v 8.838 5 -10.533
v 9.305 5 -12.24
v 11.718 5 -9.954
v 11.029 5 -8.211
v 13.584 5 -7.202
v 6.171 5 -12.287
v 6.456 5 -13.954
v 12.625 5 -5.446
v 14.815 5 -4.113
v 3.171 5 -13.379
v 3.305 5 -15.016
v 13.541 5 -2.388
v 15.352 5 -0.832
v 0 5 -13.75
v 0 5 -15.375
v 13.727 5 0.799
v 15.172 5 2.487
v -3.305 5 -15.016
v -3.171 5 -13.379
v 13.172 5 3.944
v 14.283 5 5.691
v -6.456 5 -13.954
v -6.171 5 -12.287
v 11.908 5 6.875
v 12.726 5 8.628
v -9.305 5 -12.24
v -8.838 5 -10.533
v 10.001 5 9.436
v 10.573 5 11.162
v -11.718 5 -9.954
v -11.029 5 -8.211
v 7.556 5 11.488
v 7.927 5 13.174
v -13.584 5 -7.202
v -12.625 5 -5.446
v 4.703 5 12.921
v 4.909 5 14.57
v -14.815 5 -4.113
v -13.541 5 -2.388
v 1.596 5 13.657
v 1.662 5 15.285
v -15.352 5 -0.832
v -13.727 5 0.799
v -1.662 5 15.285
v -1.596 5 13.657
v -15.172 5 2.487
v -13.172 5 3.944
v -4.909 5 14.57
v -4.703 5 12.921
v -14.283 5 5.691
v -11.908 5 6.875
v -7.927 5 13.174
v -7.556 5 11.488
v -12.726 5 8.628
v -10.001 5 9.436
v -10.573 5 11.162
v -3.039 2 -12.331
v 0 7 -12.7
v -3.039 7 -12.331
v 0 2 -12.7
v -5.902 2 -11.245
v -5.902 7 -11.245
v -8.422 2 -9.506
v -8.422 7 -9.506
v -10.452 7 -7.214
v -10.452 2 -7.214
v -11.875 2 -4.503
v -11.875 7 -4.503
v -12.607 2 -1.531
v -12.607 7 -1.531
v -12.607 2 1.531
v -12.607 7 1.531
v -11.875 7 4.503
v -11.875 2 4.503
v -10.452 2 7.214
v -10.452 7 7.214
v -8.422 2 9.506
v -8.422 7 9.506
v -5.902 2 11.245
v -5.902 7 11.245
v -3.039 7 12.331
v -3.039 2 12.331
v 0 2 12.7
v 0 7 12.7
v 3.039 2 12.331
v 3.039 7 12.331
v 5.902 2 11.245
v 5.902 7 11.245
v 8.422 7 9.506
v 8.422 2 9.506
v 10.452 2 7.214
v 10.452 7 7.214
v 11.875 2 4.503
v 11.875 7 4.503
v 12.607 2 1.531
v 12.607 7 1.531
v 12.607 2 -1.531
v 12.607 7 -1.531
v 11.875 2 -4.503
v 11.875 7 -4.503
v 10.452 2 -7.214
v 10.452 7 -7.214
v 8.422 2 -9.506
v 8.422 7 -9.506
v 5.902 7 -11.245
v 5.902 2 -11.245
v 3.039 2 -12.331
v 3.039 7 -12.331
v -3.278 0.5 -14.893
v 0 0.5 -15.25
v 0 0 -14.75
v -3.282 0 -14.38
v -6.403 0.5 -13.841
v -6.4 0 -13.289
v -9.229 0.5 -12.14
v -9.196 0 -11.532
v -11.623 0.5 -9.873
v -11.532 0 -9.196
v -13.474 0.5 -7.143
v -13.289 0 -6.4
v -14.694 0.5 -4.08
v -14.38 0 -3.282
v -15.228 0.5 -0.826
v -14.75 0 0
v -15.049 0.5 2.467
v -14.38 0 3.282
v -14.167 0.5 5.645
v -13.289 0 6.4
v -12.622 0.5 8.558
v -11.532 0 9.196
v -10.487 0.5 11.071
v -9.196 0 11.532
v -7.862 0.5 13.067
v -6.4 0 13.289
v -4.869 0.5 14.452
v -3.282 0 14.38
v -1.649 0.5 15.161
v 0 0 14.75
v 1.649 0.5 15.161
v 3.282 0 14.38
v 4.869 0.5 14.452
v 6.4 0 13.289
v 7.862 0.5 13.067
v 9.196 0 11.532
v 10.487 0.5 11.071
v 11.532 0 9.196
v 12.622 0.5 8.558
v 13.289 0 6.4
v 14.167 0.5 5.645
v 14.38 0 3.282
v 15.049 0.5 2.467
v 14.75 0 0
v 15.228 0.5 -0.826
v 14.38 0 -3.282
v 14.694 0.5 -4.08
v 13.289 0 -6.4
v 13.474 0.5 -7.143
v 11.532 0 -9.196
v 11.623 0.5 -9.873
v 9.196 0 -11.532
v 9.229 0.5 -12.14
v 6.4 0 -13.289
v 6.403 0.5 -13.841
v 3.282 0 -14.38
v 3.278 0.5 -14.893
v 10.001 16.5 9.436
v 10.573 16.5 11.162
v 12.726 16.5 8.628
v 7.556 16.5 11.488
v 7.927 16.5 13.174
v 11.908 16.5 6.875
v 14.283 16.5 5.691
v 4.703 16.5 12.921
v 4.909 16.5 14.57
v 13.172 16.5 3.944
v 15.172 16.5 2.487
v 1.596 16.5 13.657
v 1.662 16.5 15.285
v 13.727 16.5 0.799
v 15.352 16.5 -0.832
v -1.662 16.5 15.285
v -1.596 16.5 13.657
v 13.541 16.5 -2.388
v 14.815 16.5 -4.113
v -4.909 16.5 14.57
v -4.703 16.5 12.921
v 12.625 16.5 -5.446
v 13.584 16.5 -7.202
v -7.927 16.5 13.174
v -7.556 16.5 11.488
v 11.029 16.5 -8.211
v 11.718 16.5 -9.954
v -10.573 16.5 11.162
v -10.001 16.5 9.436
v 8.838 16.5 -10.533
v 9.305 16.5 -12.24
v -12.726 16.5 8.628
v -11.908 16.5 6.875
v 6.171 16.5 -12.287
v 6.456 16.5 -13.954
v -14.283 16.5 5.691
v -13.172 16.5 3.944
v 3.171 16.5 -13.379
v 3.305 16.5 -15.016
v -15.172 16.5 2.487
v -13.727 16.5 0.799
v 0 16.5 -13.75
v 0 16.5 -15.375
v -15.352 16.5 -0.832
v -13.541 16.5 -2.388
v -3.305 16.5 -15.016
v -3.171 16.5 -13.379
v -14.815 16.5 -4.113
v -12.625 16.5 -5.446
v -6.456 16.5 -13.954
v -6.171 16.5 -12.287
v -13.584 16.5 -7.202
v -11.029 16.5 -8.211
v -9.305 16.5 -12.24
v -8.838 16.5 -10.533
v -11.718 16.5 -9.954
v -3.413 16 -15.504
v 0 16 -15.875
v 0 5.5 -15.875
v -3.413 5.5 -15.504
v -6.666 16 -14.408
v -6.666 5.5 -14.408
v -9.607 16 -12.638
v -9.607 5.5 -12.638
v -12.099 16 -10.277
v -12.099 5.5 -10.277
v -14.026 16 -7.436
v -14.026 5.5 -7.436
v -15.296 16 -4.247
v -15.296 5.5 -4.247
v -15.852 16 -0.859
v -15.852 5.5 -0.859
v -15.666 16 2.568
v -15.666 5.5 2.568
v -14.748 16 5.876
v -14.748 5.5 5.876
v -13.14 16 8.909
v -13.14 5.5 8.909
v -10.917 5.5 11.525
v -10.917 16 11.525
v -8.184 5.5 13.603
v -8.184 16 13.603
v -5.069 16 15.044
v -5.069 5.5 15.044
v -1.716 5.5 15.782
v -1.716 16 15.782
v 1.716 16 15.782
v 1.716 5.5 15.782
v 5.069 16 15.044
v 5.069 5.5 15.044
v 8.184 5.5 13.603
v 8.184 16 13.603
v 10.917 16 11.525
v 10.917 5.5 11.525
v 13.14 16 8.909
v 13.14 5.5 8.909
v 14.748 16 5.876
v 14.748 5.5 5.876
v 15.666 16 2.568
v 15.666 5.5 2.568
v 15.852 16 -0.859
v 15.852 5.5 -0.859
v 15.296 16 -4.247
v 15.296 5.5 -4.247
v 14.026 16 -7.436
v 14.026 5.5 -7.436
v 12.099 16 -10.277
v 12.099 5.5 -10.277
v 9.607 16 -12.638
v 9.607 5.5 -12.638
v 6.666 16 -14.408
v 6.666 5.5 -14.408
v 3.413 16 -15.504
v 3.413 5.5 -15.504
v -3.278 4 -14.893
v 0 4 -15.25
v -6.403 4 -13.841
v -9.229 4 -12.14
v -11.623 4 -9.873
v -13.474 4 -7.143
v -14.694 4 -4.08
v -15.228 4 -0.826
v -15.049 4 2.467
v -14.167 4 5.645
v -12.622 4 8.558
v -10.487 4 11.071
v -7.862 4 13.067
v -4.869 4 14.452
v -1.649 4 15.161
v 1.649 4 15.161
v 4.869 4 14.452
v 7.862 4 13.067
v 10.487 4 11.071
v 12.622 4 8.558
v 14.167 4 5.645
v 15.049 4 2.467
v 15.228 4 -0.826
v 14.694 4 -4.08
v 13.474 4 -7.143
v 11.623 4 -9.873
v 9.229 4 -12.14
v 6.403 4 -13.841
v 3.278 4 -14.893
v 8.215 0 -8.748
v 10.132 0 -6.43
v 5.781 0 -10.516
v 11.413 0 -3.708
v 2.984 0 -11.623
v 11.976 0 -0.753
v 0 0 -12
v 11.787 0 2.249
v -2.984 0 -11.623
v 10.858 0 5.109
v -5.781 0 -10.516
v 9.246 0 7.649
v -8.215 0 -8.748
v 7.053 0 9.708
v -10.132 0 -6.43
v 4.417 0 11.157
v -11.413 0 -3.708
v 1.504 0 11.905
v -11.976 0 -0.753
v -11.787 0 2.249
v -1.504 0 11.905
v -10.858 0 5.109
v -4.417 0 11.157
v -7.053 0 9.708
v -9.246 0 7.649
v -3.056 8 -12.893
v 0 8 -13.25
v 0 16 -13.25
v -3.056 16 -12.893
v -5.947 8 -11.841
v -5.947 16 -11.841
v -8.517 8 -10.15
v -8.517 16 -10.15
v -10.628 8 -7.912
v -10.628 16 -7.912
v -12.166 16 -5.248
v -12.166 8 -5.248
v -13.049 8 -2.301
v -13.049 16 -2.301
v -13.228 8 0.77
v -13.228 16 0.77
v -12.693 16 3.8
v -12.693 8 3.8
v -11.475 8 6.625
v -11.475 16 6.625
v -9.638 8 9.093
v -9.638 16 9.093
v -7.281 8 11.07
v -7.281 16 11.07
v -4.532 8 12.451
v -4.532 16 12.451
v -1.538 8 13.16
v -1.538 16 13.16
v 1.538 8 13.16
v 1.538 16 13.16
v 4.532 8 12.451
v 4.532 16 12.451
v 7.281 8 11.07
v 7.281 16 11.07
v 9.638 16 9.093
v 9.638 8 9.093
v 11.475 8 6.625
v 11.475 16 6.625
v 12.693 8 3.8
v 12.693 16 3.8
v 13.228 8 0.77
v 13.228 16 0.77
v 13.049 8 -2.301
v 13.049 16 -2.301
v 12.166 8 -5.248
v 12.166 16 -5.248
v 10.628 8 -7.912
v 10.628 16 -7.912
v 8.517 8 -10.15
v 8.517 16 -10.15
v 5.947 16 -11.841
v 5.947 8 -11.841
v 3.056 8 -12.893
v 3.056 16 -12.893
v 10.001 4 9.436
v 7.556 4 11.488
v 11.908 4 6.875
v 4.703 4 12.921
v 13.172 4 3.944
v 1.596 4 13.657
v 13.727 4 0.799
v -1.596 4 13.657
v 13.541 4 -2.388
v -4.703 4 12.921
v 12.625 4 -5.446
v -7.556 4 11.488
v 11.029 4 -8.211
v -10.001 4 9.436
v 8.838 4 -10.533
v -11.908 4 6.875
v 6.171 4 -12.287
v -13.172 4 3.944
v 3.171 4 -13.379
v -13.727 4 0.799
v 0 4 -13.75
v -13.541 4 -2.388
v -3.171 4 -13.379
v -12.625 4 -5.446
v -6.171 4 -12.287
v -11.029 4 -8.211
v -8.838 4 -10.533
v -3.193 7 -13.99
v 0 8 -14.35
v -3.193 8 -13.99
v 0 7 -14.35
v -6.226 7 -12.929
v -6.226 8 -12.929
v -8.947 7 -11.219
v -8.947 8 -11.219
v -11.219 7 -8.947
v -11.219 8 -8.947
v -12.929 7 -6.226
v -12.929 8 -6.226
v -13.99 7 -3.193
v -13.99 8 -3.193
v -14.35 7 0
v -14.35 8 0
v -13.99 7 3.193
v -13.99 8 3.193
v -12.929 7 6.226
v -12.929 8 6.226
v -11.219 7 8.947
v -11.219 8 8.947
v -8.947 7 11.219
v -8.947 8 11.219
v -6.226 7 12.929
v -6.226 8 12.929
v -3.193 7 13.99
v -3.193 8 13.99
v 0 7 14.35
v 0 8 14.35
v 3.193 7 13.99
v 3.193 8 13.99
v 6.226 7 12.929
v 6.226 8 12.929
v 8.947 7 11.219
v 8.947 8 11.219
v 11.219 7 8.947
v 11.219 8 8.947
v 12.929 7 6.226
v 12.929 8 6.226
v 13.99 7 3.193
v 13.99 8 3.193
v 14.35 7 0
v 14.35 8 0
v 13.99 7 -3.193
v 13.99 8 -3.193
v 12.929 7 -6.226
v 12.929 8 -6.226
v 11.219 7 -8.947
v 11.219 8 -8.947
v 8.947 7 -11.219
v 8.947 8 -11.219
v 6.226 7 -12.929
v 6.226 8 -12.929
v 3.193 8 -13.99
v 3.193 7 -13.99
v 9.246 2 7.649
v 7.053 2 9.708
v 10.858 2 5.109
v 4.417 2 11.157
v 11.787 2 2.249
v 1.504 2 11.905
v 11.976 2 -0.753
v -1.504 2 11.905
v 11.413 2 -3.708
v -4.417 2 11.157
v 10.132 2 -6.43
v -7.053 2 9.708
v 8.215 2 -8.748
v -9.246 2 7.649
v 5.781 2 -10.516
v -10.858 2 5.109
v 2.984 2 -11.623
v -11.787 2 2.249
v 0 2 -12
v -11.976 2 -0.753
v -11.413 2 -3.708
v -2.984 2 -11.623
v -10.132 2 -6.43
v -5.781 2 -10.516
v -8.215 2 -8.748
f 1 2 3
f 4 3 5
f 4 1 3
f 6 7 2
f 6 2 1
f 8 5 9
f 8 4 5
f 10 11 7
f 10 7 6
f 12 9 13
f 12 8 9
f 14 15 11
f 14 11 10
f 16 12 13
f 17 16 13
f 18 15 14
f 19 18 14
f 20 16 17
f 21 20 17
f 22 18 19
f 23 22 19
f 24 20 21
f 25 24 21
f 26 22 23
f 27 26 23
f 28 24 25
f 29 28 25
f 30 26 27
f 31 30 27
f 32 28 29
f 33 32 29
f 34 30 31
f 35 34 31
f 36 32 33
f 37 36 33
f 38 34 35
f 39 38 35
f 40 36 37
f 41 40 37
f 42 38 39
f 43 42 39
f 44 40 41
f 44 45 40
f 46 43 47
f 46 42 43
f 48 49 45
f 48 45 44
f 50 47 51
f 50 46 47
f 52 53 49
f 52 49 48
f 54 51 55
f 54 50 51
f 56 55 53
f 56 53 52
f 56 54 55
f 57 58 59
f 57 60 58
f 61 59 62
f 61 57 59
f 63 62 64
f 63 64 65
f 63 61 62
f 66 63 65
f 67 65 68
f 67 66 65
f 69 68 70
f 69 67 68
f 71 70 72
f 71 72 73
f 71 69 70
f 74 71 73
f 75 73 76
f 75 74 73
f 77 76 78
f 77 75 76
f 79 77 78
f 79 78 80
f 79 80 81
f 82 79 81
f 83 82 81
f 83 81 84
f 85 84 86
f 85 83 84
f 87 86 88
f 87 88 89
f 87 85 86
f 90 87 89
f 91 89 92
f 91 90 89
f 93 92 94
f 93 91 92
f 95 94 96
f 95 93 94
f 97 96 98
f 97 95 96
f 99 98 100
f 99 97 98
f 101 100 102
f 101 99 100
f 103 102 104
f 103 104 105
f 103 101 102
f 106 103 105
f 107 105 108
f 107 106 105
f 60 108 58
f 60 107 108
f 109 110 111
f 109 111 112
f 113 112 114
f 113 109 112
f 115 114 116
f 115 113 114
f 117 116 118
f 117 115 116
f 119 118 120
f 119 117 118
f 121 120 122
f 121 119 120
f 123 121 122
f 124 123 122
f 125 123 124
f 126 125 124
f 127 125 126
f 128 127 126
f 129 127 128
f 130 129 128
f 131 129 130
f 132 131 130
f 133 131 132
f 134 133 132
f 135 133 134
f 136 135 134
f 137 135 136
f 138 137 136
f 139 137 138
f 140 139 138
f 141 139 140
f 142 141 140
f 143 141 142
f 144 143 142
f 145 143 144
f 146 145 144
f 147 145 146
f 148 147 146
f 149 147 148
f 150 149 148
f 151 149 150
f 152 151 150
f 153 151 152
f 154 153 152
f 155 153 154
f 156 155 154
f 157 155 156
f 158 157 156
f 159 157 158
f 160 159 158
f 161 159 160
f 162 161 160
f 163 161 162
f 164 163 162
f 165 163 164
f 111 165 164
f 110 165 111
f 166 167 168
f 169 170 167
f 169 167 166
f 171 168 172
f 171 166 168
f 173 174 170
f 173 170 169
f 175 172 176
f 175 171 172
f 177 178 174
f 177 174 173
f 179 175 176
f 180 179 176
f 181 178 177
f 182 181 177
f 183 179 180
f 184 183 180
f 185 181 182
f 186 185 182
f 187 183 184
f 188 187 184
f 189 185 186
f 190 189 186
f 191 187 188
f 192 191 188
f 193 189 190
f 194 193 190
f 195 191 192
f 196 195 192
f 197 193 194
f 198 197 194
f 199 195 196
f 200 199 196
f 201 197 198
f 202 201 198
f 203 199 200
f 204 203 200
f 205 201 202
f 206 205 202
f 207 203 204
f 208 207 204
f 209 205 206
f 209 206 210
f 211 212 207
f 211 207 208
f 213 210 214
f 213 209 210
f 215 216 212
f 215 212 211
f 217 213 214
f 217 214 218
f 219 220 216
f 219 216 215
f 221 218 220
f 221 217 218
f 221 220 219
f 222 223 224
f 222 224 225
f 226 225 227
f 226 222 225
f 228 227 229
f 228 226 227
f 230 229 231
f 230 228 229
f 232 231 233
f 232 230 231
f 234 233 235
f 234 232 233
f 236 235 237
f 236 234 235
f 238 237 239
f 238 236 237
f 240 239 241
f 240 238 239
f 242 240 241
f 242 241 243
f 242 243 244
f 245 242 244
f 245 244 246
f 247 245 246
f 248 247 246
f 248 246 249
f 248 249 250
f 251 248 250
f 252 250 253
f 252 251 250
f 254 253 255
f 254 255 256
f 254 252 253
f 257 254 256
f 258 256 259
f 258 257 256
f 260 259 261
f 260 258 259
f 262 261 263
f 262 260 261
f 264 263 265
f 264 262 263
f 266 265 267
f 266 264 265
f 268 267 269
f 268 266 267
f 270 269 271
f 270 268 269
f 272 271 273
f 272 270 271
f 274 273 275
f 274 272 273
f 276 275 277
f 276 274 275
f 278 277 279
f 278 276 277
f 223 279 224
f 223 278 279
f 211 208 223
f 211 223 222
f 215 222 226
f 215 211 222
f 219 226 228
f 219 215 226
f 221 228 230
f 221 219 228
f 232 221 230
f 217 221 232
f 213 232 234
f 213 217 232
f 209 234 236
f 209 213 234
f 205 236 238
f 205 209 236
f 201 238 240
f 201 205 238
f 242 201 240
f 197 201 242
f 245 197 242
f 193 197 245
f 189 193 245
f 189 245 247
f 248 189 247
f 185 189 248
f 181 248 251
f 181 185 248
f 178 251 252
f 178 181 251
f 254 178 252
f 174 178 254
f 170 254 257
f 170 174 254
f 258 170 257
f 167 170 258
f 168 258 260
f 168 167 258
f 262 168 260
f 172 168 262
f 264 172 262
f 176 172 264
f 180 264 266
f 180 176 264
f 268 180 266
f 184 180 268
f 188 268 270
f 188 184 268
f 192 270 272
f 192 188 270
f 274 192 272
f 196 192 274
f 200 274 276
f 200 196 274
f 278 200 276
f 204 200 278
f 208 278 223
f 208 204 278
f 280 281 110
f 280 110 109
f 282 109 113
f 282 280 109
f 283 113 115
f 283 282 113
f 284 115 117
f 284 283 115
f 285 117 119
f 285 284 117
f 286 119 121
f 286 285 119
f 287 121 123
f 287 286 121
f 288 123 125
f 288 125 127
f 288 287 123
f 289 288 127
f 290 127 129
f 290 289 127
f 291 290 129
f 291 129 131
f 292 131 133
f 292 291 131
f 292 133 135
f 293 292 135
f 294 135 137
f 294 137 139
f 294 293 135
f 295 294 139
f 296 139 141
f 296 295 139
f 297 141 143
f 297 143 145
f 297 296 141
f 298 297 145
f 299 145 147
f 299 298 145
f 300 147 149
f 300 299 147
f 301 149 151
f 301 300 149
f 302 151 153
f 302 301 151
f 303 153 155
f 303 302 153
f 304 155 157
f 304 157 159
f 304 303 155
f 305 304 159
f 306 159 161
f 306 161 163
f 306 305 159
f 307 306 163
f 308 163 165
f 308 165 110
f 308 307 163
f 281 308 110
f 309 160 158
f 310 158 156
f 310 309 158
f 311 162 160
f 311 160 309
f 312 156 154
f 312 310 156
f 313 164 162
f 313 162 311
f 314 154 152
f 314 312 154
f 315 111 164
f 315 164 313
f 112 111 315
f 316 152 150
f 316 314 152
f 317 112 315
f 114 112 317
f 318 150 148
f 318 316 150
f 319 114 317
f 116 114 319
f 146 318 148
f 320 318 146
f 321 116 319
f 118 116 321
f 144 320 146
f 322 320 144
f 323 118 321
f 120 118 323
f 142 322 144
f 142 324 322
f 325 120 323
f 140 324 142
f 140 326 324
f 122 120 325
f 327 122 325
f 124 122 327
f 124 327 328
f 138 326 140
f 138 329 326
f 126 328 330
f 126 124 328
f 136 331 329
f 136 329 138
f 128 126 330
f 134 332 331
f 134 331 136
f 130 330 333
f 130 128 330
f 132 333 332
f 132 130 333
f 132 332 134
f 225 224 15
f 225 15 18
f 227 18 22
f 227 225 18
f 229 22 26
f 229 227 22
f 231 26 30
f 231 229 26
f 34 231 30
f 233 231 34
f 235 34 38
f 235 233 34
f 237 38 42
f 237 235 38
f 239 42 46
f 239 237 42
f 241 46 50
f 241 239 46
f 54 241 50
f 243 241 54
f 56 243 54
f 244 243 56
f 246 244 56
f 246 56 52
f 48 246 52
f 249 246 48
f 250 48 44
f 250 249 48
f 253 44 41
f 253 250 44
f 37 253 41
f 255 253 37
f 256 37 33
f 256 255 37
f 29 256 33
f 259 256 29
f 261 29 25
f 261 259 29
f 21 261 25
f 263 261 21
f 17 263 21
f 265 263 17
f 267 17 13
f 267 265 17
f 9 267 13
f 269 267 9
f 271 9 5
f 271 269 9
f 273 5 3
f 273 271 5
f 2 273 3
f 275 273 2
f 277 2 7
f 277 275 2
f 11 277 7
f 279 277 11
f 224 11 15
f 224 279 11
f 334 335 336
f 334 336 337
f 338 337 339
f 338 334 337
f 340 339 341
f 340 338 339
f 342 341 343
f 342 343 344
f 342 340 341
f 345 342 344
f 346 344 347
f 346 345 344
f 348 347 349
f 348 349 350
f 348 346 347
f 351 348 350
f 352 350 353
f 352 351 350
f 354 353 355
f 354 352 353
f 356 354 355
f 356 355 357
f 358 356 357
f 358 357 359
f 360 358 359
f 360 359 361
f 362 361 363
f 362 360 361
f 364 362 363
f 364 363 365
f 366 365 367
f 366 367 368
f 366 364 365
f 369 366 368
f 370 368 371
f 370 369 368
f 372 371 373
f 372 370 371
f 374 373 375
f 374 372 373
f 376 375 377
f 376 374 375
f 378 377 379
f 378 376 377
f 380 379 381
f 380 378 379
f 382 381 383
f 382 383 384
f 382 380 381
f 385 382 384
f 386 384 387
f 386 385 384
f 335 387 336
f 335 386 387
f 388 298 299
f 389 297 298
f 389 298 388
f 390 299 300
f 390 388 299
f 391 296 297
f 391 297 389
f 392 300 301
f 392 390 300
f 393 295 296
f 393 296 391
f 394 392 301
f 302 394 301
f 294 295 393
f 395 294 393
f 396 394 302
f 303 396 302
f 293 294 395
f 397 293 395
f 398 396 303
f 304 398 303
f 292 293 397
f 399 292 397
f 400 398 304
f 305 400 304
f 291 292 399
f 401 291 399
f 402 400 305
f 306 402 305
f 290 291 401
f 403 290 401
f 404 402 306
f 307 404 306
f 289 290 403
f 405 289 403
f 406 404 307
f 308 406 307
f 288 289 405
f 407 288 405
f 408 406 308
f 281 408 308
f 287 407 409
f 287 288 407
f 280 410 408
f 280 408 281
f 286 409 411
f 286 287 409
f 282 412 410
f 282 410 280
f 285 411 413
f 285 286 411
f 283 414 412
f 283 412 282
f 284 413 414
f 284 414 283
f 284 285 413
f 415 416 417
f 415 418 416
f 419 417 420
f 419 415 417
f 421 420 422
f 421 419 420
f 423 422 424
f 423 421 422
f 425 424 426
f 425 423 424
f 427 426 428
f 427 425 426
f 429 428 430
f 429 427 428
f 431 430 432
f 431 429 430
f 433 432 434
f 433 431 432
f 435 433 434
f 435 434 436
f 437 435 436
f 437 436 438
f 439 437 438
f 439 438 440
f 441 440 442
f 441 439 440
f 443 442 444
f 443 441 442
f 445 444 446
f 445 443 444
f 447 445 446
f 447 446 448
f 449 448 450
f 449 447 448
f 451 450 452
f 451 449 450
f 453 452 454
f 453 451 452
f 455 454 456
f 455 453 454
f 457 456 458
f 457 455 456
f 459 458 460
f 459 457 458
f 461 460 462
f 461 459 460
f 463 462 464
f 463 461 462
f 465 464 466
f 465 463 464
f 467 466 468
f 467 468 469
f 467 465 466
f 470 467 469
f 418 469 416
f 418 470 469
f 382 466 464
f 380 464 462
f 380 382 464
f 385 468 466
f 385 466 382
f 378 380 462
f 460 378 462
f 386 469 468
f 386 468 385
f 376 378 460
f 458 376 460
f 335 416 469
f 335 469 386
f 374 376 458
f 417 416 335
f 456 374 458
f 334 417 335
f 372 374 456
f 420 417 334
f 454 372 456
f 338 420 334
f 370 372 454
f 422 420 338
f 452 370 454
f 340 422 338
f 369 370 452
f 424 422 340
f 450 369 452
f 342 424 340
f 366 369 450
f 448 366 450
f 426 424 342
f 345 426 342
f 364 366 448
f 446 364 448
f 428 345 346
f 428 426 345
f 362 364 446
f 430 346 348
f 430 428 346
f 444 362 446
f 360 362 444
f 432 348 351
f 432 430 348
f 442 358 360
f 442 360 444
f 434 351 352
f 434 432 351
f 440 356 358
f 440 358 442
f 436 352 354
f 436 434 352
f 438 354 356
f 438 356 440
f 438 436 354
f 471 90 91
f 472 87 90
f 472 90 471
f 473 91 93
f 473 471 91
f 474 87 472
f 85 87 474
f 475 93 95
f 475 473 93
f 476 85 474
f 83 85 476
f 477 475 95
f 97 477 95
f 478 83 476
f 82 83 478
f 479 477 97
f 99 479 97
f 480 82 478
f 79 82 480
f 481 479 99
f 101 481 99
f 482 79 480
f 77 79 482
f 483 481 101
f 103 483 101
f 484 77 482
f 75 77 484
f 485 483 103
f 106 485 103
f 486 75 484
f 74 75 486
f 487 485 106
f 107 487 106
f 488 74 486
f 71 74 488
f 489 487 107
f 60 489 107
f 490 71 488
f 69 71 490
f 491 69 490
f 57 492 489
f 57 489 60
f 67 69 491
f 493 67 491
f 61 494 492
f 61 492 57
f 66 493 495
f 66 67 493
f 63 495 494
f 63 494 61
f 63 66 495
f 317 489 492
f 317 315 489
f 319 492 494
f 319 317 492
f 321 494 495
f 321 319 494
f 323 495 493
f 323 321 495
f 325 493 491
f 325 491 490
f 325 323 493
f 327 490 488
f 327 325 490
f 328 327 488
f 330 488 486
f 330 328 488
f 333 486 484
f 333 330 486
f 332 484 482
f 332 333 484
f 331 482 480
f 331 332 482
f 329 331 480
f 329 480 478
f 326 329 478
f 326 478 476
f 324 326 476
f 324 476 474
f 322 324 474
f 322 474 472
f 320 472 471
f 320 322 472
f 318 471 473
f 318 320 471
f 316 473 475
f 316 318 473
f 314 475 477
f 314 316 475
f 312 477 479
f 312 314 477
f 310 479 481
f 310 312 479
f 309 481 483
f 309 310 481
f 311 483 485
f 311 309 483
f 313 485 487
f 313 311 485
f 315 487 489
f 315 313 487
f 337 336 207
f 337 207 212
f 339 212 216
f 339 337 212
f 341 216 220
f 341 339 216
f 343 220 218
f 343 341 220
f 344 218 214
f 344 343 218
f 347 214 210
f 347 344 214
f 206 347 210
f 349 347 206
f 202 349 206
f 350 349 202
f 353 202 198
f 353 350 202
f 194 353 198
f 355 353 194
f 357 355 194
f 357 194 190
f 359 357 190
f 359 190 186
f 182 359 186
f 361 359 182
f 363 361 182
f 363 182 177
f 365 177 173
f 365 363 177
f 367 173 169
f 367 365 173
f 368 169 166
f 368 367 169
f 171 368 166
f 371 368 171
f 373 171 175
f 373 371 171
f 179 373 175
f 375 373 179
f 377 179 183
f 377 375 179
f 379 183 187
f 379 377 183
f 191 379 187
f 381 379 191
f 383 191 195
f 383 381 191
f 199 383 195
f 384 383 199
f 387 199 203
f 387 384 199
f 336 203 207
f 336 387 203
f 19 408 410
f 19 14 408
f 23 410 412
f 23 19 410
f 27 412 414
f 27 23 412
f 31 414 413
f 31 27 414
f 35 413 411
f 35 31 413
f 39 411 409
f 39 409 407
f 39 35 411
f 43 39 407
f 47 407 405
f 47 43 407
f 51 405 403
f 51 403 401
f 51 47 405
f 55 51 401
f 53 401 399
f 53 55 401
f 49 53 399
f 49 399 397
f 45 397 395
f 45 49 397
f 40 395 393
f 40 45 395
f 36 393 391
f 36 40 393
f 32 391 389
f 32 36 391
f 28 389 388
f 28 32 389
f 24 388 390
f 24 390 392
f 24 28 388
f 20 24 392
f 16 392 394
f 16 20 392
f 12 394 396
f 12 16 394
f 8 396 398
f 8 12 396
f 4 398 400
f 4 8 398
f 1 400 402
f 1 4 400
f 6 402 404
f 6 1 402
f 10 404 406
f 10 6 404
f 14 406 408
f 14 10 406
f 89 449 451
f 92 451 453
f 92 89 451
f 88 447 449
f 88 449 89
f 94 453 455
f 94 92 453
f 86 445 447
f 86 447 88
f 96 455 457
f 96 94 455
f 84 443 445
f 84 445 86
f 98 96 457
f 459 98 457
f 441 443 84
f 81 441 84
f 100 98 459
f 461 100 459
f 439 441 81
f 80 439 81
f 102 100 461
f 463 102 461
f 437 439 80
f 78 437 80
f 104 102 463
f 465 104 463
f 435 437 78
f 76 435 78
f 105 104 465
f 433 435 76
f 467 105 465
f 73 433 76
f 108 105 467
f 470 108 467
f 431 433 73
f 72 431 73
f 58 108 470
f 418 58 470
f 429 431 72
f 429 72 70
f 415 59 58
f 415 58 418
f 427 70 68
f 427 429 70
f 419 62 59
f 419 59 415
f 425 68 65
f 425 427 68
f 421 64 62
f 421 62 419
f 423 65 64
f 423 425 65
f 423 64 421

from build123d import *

# Parameters (mm, degrees)
CHAMFER_1_SIZE = 0.5


with BuildPart() as part:
    # 草图1 → 旋转1 (revolve)
    with BuildSketch(Plane.XY, mode=Mode.PRIVATE) as revolve_1_sk:
        Polygon((12, 0), (15.25, 0), (15.25, 4), (13.75, 4), (13.75, 5), (15.875, 5), (15.875, 16.5), (13.25, 16.5), (13.25, 8), (14.35, 8), (14.35, 7), (12.7, 7), (12.7, 2), (12, 2), align=None)
    revolve(revolve_1_sk.sketch.rotate(Axis((0, 0, 0), (0, 1, 0)), 90), axis=Axis((0, 0, 0), (0, 1, 0)))  # turned: the seam where the file's is

    # 倒角1
    chamfer_1_edges = [part.edges().sort_by_distance(p)[0] for p in [
        (0, 16.5, 13.25),
        (0, 16.5, 15.875),
        (0, 5, 15.875),
        (0, 0, 15.25),
    ]]
    chamfer(chamfer_1_edges, length=CHAMFER_1_SIZE)


solid = part.part
